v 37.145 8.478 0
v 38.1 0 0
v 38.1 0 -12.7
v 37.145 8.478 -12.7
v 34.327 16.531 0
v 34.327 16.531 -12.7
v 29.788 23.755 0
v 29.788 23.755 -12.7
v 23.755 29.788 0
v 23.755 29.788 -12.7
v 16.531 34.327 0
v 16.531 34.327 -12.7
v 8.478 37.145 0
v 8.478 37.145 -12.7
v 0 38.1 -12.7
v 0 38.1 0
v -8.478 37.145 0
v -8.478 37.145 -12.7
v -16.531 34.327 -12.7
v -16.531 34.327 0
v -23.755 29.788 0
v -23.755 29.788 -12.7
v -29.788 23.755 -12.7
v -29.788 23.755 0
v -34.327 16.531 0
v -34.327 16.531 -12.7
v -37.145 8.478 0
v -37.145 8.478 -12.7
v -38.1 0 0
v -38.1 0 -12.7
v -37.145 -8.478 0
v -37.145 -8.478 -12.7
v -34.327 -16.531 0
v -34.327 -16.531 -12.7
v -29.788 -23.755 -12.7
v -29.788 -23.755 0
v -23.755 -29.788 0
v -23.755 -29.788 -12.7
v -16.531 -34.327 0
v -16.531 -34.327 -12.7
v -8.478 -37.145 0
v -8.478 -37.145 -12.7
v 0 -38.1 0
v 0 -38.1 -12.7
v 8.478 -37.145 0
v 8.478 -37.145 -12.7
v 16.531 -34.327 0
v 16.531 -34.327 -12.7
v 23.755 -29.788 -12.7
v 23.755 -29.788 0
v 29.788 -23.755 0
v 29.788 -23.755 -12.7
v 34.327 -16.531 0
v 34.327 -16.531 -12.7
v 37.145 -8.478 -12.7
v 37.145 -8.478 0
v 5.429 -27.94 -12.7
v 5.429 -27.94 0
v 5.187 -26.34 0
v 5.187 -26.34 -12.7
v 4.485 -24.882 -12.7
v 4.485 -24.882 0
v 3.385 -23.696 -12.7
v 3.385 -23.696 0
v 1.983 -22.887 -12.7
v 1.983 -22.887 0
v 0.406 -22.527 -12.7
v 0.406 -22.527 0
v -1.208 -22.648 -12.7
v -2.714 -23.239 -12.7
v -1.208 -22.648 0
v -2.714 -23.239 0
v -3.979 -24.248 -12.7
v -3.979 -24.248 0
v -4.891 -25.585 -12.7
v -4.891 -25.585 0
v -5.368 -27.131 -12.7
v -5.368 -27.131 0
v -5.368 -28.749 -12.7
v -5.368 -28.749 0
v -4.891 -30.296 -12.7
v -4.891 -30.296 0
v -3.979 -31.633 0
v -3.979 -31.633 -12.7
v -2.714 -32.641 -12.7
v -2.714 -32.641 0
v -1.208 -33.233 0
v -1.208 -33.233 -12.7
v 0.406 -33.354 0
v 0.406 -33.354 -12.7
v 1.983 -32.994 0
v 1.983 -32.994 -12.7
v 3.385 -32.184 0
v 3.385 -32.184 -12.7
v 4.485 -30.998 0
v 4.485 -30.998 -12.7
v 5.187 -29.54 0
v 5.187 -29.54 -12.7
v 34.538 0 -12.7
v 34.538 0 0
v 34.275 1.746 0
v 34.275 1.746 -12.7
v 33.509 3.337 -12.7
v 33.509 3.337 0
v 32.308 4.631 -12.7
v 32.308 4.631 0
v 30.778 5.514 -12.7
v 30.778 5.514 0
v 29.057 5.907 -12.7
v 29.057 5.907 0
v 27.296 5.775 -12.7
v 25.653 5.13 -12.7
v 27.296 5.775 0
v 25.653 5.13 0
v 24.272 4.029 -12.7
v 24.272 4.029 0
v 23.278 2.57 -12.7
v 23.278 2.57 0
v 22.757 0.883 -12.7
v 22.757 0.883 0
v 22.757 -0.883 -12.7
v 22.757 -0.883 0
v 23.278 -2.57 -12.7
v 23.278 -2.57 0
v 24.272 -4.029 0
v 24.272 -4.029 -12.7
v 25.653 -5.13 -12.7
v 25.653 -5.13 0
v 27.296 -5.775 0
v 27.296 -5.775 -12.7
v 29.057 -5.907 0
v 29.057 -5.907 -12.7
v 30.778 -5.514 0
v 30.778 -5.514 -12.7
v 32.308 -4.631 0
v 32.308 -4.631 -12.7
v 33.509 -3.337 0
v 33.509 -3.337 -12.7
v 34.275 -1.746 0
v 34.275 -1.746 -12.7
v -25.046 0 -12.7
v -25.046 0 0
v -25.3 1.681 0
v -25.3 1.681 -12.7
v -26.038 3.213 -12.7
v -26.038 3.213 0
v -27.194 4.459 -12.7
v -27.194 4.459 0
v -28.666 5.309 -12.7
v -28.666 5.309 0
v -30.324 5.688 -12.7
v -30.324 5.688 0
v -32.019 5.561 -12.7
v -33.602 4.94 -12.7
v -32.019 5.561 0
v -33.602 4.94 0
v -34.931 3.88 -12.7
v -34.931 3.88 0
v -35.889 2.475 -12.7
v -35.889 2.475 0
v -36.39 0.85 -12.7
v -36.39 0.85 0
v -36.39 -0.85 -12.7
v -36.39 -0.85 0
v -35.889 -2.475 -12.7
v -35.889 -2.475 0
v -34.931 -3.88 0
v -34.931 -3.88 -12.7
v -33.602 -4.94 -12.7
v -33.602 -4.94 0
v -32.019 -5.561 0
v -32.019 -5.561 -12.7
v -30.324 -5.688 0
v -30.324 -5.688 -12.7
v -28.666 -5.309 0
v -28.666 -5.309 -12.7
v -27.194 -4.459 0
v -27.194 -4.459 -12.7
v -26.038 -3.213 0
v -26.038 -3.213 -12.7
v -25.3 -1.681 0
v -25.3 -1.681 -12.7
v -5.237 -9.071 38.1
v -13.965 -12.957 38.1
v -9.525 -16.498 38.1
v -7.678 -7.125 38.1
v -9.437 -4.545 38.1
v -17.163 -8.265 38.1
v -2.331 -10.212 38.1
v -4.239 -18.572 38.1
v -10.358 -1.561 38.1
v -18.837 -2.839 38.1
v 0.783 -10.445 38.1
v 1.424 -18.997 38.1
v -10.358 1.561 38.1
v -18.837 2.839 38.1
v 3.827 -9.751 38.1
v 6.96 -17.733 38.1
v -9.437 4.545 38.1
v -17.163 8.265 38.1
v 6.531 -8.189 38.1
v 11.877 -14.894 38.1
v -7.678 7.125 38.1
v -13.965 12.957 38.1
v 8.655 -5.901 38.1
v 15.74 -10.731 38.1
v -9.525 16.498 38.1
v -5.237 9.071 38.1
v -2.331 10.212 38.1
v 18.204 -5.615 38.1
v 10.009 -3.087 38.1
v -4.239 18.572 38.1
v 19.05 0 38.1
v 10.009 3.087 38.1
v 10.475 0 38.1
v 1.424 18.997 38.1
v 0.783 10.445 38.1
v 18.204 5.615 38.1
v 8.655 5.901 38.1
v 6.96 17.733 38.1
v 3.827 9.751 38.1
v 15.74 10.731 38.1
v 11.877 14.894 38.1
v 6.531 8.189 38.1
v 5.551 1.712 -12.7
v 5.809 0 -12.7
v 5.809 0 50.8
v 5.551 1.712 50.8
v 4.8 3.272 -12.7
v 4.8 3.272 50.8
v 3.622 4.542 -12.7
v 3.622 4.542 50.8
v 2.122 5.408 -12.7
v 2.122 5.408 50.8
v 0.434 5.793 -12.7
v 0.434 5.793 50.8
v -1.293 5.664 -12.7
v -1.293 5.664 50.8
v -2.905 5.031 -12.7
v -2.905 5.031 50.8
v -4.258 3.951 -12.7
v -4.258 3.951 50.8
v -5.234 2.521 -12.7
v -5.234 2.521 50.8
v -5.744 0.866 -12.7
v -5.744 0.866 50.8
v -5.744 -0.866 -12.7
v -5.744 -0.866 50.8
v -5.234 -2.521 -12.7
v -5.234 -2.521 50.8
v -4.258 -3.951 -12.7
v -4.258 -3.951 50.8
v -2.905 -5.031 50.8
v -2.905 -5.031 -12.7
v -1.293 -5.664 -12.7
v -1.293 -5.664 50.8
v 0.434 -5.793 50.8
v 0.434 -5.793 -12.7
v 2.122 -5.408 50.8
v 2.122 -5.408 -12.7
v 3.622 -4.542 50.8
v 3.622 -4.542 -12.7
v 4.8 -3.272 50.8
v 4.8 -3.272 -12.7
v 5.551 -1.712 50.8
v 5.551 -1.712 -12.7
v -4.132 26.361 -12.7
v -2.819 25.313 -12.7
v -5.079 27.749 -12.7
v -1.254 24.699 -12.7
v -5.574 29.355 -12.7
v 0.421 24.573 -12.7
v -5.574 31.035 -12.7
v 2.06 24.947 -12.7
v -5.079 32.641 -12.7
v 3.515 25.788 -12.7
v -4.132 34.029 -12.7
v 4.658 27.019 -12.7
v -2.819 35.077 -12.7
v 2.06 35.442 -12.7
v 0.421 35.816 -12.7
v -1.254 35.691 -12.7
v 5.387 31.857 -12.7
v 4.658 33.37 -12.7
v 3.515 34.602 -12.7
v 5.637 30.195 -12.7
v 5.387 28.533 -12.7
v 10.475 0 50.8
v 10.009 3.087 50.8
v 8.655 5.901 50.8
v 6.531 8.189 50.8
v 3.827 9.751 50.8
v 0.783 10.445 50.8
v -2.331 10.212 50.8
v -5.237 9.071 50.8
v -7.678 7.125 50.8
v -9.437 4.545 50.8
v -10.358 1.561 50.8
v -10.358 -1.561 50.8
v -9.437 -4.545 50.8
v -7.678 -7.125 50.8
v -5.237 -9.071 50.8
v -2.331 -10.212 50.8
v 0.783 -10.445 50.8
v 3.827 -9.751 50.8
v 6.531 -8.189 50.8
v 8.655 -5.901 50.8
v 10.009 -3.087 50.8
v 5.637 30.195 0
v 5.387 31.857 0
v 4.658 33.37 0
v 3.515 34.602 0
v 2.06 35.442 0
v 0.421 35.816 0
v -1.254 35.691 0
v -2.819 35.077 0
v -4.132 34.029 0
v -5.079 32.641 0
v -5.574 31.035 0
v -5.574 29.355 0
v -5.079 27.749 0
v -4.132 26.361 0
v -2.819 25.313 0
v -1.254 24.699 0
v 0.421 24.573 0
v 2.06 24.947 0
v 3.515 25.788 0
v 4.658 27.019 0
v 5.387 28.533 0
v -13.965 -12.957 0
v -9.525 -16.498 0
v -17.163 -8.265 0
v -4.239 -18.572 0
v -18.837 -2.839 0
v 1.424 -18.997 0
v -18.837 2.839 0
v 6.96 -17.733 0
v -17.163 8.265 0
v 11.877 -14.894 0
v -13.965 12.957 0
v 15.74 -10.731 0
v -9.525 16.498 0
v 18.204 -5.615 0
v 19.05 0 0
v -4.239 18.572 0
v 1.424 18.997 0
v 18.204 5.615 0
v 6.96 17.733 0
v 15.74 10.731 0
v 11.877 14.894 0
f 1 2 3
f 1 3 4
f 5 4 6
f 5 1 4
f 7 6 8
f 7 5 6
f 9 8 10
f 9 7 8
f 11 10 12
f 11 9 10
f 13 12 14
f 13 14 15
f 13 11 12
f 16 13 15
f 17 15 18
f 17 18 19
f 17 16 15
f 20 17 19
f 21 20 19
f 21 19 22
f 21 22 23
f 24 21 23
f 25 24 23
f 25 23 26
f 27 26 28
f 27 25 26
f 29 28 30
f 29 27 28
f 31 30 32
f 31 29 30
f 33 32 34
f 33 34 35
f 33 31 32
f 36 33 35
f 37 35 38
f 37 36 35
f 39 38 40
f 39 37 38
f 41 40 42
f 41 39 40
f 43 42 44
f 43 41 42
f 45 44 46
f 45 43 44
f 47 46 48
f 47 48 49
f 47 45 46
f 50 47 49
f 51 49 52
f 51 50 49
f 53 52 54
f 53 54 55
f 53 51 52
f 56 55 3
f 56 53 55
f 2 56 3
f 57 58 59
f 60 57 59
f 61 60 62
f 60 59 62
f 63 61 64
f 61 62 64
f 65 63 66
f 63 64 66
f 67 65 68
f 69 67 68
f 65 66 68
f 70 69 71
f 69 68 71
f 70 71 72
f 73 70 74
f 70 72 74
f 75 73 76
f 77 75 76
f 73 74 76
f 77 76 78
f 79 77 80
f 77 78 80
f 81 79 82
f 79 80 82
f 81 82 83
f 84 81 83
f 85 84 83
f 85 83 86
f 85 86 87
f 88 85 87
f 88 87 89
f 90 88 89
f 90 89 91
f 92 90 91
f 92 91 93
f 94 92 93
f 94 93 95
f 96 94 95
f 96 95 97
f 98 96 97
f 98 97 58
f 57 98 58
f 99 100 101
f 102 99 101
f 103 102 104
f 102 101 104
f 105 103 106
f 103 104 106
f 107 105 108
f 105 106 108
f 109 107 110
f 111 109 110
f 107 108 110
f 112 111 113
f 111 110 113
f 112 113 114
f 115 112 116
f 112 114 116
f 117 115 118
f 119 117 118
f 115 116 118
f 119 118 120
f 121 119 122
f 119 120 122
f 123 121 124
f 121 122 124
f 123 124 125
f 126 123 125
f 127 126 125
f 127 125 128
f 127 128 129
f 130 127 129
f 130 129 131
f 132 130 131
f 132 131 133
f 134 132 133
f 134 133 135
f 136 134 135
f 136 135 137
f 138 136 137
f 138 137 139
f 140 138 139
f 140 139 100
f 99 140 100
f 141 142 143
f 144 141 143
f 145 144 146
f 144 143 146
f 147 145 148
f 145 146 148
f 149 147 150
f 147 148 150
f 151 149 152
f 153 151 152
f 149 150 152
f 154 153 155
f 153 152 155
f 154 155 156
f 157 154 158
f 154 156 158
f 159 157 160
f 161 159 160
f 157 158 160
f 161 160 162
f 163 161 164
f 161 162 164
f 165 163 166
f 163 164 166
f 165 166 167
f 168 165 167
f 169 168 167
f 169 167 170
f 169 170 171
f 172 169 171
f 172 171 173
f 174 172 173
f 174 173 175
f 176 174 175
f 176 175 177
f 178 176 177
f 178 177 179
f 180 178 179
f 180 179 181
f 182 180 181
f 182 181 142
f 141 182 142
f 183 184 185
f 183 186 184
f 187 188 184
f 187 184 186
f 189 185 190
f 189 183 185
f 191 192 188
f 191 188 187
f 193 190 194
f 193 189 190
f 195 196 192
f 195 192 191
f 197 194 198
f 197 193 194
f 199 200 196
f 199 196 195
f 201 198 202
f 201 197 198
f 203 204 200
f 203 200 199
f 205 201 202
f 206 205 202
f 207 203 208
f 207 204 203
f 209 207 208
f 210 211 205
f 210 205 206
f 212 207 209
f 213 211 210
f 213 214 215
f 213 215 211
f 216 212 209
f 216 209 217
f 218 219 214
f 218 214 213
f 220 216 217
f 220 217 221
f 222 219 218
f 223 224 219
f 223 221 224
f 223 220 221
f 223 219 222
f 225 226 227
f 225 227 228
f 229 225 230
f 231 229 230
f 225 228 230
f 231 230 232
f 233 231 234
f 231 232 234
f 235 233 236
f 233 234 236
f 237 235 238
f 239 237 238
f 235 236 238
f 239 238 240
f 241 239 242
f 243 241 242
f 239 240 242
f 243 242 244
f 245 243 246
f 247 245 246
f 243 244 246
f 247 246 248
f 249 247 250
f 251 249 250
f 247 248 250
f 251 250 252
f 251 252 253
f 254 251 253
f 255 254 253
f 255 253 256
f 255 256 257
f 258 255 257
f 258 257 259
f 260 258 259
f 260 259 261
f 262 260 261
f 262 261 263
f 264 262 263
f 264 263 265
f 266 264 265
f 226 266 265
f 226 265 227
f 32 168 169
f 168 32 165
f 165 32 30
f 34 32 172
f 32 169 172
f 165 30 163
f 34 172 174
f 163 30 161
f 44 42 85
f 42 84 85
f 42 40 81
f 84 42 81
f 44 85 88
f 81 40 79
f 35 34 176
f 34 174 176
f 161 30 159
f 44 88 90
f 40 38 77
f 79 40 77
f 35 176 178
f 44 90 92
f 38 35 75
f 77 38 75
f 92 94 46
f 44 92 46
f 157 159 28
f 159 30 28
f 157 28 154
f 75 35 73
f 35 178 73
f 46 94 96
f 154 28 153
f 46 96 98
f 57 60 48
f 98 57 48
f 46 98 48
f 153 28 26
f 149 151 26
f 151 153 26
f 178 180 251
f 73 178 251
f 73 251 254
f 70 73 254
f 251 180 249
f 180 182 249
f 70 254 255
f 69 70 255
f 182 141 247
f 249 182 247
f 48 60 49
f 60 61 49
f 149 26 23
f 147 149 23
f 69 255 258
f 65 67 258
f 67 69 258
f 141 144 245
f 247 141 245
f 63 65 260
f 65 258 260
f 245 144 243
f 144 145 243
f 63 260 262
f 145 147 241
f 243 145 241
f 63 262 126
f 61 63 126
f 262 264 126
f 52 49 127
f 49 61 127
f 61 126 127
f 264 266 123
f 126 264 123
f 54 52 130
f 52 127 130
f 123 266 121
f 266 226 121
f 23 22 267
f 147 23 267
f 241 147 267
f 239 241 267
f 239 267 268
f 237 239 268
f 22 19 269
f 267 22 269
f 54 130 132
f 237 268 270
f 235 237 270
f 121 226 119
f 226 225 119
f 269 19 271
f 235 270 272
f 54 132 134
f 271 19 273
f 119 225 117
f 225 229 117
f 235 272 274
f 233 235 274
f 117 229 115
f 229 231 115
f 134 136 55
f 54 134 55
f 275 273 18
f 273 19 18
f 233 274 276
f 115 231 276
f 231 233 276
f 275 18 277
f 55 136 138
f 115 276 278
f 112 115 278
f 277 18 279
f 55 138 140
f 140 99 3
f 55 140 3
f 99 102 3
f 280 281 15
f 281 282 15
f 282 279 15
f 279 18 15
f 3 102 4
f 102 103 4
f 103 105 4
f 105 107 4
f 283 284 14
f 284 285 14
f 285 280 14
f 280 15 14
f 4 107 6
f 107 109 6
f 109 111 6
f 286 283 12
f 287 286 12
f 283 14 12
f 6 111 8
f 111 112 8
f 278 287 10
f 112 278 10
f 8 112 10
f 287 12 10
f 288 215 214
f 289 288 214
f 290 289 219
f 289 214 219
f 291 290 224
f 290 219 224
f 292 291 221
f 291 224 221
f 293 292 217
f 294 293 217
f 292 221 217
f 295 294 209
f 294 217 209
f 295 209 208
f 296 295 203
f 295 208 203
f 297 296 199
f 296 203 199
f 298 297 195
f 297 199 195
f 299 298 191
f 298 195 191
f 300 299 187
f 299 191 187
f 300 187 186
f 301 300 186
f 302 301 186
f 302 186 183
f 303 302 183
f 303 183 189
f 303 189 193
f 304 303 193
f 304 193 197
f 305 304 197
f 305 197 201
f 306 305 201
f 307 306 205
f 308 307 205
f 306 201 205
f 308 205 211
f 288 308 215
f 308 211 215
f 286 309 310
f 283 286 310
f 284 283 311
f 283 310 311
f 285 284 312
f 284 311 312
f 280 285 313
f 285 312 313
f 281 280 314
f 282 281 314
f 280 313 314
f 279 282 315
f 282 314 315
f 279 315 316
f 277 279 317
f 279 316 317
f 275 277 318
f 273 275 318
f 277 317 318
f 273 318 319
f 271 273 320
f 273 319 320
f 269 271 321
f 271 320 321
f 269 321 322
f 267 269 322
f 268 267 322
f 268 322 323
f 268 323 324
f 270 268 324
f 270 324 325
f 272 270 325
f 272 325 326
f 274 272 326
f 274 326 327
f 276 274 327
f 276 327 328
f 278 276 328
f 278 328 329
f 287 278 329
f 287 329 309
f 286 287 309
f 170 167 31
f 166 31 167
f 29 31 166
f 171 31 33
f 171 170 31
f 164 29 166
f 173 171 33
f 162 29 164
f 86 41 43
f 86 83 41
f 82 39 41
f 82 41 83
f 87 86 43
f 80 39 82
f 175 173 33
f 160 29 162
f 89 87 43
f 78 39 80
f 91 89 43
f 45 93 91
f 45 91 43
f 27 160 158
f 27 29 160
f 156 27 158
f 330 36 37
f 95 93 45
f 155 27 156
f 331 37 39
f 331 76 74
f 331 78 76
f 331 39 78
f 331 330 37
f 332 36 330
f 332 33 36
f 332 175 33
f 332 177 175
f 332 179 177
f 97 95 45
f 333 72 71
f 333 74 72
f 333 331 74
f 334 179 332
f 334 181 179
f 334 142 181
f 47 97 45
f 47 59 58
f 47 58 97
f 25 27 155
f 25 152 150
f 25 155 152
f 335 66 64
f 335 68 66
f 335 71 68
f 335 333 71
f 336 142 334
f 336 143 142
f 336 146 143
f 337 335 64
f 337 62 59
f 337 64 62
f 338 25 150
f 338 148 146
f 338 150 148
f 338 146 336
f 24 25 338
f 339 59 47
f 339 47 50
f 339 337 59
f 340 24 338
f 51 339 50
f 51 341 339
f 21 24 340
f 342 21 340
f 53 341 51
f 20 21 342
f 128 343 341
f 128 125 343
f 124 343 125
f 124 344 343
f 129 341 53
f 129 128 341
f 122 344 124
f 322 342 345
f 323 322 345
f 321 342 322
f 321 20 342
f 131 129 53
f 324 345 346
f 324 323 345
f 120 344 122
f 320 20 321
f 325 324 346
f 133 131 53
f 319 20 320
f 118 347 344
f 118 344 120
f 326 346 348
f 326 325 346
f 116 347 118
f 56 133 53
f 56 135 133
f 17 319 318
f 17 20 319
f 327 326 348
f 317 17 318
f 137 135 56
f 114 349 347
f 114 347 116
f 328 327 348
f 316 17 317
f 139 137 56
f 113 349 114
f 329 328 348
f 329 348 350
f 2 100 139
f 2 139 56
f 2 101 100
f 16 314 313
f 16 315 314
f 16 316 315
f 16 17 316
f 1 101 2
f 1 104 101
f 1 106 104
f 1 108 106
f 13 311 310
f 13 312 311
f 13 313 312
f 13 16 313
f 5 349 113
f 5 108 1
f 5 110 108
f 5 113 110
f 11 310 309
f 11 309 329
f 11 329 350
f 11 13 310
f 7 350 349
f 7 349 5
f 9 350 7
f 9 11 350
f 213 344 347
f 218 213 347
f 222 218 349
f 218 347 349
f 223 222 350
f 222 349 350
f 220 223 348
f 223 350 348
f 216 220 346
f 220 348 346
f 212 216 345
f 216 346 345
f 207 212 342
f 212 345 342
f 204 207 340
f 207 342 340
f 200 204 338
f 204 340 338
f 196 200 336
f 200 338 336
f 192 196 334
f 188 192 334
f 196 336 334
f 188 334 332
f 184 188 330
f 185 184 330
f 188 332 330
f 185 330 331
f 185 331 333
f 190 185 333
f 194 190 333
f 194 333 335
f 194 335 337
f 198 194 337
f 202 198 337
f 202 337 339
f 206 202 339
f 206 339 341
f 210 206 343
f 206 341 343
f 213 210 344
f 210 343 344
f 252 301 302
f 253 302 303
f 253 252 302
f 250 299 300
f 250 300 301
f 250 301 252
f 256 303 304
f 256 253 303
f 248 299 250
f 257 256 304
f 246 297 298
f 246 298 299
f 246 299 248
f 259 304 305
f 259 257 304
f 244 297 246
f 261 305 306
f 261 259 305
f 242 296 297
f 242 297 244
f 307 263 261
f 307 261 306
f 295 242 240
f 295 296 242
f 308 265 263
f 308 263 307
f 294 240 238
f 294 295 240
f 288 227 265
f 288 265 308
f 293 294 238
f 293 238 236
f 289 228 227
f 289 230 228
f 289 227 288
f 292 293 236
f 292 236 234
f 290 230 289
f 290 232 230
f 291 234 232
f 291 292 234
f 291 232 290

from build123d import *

# Parameters (mm, degrees)
F0_R     = 38.1
F1_DEPTH = 12.7
F2_R     = 19.05
F3_DEPTH = 38.1
F4_R     = 10.474618
F5_DEPTH = 12.7
F6_R     = 5.428581
F6_R_2   = 5.923411
F6_R_3   = 5.637256
F6_R_4   = 5.703751
F7_DEPTH = 12.701
F8_R     = 5.809223
F9_DEPTH = 63.501


with BuildPart() as f1:
    # F0 (on Top) → F1 (new body)
    with BuildSketch(Plane.XY):
        Circle(F0_R)
    extrude(amount=-F1_DEPTH)

    # F2 (on face) → F3 (join)
    with BuildSketch(Plane.XY):
        Circle(F2_R)
    extrude(amount=F3_DEPTH)

    # F4 (on face) → F5 (join)
    with BuildSketch(Plane.XY.offset(38.1)):
        Circle(F4_R)
    extrude(amount=F5_DEPTH)

    # F6 (on face) → F7 (cut, through all)
    with BuildSketch(Plane.XY):
        with Locations((0, -27.94018)):
            Circle(F6_R)
        with Locations((28.614422, 0)):
            Circle(F6_R_2)
        with Locations((0, 30.194912)):
            Circle(F6_R_3)
        with Locations((-30.750221, 0)):
            Circle(F6_R_4)
    extrude(amount=-F7_DEPTH, mode=Mode.SUBTRACT)

    # F8 (on face) → F9 (cut, through all)
    with BuildSketch(Plane.XY.offset(50.8)):
        Circle(F8_R)
    extrude(amount=-F9_DEPTH, mode=Mode.SUBTRACT)


solid = f1.part
